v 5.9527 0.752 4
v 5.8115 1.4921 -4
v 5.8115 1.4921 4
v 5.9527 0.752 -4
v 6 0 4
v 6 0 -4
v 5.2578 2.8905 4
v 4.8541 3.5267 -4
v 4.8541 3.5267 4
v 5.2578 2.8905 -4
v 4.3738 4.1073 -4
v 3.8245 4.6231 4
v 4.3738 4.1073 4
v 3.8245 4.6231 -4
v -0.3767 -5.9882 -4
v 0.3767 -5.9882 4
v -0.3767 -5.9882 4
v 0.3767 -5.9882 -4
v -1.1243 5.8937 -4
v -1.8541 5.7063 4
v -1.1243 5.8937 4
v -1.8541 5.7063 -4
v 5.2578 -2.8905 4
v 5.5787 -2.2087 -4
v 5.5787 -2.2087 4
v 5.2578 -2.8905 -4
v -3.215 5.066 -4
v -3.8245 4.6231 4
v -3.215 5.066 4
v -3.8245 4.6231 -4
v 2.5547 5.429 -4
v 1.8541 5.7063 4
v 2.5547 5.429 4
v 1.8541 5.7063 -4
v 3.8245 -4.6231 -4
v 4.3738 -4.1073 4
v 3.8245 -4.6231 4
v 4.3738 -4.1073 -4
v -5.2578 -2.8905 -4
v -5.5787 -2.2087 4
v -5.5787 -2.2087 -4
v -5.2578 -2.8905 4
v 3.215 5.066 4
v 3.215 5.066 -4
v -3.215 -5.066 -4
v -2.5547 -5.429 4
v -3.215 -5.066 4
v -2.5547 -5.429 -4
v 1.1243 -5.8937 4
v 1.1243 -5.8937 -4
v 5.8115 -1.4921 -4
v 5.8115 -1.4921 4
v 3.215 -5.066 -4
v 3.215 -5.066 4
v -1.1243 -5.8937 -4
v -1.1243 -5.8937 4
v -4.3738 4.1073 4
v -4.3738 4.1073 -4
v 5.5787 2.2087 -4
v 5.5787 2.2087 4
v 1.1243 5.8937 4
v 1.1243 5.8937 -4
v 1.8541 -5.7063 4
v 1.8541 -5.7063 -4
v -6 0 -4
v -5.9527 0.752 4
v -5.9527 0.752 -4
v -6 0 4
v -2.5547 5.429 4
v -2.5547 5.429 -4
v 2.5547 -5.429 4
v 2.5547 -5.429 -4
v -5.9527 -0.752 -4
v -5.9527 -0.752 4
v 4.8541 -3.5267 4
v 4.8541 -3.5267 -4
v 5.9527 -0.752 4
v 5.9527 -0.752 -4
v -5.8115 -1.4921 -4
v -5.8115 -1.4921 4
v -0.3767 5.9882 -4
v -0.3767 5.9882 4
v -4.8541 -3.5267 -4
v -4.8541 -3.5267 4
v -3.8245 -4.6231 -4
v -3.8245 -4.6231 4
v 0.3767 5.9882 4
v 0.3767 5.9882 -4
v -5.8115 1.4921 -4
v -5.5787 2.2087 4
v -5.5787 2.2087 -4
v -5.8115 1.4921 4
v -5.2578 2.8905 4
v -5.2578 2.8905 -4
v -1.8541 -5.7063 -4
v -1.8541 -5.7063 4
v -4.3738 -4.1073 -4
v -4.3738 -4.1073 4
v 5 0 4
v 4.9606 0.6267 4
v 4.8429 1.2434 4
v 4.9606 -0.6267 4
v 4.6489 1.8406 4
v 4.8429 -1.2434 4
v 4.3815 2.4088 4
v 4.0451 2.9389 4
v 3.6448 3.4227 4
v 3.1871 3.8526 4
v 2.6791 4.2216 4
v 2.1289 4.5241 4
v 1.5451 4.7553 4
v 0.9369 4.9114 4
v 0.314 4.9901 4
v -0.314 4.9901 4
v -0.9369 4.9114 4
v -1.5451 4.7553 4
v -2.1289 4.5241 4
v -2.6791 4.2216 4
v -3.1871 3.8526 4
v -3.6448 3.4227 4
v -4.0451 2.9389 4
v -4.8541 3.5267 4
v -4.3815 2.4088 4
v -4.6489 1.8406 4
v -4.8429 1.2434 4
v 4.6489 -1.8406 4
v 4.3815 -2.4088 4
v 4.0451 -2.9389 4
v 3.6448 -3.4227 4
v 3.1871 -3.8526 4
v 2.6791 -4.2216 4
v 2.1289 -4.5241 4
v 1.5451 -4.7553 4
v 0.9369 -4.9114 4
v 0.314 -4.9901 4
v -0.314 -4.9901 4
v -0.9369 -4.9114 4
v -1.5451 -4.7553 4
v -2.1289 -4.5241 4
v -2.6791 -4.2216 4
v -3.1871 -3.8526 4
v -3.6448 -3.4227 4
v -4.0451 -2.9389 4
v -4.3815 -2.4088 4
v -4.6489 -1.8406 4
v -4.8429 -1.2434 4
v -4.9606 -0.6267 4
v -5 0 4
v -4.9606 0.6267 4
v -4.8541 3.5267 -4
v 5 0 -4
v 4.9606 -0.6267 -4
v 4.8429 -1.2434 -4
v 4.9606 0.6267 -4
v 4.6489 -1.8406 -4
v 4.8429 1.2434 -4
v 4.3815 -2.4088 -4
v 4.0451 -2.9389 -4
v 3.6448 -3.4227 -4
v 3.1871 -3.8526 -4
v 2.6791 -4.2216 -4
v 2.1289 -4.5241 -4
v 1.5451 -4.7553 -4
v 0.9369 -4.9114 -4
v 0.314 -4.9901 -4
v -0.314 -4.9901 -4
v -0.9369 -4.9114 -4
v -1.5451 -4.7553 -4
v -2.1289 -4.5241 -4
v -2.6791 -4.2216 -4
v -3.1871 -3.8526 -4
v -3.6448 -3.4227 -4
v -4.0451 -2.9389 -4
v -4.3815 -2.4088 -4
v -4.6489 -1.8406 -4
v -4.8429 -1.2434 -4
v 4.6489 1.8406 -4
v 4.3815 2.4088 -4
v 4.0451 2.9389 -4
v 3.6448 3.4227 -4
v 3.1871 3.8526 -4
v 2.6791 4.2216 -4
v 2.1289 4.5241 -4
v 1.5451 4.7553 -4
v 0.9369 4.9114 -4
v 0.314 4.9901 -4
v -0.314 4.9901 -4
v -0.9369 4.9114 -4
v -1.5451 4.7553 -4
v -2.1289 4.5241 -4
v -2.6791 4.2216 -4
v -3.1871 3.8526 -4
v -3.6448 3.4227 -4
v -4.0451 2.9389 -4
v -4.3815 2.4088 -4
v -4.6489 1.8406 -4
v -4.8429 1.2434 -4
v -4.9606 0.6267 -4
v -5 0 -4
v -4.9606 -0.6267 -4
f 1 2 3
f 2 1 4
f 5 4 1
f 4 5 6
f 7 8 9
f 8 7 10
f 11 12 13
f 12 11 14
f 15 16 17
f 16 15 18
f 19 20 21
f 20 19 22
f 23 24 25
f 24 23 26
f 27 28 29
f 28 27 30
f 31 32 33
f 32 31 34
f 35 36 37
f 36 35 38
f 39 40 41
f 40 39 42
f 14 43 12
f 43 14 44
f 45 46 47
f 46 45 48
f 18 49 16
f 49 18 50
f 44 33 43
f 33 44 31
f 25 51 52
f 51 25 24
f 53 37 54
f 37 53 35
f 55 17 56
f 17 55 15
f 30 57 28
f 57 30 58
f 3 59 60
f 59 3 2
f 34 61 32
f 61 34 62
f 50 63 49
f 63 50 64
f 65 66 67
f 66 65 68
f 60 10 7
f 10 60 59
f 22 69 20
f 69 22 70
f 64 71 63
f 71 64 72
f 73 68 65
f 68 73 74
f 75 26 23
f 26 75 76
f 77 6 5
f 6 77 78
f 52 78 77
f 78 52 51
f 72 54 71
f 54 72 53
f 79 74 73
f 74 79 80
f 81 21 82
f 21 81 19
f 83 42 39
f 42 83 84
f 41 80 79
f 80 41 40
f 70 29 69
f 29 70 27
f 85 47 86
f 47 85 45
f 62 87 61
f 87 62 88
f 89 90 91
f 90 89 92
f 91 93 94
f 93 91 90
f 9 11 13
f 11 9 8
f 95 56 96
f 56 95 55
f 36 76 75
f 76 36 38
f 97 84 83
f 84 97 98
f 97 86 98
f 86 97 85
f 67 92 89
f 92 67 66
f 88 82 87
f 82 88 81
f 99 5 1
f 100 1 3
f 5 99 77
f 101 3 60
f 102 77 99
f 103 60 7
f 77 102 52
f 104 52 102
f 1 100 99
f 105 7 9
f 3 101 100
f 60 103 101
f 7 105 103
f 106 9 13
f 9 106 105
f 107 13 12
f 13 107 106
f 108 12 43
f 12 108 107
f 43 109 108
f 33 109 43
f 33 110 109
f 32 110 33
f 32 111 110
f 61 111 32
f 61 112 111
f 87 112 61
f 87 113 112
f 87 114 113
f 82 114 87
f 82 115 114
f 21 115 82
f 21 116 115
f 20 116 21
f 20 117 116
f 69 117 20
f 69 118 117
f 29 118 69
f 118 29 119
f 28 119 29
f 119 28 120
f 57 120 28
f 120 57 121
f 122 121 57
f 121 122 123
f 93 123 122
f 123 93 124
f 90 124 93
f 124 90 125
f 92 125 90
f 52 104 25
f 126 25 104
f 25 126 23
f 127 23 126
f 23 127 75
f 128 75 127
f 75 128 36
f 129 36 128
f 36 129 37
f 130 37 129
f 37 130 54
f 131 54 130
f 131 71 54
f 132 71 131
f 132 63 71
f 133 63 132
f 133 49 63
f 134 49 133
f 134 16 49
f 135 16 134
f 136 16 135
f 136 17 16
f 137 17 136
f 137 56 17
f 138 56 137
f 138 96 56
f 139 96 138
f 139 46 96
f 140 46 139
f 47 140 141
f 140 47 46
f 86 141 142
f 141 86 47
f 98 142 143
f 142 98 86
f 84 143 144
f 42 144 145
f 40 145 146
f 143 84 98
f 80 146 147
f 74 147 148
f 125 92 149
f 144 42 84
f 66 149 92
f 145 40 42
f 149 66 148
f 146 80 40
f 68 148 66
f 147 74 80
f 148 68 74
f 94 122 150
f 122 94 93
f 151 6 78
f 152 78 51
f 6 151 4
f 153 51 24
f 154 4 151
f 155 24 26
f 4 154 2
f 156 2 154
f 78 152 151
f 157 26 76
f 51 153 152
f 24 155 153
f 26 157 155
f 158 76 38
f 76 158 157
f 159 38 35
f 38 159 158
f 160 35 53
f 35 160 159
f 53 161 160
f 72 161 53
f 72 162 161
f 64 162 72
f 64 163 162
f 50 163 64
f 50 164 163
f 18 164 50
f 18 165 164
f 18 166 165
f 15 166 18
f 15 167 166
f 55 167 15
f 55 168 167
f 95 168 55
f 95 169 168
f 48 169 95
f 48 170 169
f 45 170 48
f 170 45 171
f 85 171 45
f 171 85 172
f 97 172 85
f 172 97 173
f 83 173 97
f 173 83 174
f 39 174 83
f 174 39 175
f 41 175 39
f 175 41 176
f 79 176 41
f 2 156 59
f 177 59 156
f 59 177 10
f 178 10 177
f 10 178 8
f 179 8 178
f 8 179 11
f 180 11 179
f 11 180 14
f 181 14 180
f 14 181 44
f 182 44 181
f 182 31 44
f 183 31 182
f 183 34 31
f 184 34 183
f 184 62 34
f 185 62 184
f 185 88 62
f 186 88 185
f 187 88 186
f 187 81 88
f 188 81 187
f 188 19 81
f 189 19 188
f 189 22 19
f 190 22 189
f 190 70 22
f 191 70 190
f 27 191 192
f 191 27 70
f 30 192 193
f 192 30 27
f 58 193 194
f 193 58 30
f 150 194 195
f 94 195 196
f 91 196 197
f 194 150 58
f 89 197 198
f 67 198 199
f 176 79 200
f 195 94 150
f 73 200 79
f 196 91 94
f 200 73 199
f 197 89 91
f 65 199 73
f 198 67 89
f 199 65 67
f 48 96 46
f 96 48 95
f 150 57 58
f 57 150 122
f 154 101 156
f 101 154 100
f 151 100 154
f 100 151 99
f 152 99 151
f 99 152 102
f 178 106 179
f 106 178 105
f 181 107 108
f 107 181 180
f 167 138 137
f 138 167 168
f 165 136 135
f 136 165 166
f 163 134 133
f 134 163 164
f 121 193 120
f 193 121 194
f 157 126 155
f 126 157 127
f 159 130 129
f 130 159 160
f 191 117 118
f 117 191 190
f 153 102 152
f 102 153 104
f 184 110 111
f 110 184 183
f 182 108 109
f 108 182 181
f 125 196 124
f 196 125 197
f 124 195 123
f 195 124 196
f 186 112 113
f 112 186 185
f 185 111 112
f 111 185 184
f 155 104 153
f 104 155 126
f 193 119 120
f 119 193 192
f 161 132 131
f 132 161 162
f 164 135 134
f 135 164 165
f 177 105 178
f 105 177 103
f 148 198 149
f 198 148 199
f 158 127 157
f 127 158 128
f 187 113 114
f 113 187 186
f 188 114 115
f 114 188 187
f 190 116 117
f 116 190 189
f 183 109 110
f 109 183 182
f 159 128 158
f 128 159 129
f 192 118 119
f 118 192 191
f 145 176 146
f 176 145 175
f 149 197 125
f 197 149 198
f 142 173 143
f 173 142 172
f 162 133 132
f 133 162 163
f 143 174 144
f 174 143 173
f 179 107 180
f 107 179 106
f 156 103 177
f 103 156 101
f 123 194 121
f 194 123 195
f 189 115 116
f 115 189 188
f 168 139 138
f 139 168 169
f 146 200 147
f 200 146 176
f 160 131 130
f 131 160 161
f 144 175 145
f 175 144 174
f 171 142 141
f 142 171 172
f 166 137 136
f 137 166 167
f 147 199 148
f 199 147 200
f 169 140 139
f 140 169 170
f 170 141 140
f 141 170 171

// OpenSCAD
$fn = 50;


difference() {
	union() {
		translate(v = [0, 0, -4.0000000000]) {
			cylinder(h = 8, r = 6.0000000000);
		}
	}
	union() {
		translate(v = [0, 0, -100.0000000000]) {
			cylinder(h = 200, r = 5.0000000000);
		}
	}
}
